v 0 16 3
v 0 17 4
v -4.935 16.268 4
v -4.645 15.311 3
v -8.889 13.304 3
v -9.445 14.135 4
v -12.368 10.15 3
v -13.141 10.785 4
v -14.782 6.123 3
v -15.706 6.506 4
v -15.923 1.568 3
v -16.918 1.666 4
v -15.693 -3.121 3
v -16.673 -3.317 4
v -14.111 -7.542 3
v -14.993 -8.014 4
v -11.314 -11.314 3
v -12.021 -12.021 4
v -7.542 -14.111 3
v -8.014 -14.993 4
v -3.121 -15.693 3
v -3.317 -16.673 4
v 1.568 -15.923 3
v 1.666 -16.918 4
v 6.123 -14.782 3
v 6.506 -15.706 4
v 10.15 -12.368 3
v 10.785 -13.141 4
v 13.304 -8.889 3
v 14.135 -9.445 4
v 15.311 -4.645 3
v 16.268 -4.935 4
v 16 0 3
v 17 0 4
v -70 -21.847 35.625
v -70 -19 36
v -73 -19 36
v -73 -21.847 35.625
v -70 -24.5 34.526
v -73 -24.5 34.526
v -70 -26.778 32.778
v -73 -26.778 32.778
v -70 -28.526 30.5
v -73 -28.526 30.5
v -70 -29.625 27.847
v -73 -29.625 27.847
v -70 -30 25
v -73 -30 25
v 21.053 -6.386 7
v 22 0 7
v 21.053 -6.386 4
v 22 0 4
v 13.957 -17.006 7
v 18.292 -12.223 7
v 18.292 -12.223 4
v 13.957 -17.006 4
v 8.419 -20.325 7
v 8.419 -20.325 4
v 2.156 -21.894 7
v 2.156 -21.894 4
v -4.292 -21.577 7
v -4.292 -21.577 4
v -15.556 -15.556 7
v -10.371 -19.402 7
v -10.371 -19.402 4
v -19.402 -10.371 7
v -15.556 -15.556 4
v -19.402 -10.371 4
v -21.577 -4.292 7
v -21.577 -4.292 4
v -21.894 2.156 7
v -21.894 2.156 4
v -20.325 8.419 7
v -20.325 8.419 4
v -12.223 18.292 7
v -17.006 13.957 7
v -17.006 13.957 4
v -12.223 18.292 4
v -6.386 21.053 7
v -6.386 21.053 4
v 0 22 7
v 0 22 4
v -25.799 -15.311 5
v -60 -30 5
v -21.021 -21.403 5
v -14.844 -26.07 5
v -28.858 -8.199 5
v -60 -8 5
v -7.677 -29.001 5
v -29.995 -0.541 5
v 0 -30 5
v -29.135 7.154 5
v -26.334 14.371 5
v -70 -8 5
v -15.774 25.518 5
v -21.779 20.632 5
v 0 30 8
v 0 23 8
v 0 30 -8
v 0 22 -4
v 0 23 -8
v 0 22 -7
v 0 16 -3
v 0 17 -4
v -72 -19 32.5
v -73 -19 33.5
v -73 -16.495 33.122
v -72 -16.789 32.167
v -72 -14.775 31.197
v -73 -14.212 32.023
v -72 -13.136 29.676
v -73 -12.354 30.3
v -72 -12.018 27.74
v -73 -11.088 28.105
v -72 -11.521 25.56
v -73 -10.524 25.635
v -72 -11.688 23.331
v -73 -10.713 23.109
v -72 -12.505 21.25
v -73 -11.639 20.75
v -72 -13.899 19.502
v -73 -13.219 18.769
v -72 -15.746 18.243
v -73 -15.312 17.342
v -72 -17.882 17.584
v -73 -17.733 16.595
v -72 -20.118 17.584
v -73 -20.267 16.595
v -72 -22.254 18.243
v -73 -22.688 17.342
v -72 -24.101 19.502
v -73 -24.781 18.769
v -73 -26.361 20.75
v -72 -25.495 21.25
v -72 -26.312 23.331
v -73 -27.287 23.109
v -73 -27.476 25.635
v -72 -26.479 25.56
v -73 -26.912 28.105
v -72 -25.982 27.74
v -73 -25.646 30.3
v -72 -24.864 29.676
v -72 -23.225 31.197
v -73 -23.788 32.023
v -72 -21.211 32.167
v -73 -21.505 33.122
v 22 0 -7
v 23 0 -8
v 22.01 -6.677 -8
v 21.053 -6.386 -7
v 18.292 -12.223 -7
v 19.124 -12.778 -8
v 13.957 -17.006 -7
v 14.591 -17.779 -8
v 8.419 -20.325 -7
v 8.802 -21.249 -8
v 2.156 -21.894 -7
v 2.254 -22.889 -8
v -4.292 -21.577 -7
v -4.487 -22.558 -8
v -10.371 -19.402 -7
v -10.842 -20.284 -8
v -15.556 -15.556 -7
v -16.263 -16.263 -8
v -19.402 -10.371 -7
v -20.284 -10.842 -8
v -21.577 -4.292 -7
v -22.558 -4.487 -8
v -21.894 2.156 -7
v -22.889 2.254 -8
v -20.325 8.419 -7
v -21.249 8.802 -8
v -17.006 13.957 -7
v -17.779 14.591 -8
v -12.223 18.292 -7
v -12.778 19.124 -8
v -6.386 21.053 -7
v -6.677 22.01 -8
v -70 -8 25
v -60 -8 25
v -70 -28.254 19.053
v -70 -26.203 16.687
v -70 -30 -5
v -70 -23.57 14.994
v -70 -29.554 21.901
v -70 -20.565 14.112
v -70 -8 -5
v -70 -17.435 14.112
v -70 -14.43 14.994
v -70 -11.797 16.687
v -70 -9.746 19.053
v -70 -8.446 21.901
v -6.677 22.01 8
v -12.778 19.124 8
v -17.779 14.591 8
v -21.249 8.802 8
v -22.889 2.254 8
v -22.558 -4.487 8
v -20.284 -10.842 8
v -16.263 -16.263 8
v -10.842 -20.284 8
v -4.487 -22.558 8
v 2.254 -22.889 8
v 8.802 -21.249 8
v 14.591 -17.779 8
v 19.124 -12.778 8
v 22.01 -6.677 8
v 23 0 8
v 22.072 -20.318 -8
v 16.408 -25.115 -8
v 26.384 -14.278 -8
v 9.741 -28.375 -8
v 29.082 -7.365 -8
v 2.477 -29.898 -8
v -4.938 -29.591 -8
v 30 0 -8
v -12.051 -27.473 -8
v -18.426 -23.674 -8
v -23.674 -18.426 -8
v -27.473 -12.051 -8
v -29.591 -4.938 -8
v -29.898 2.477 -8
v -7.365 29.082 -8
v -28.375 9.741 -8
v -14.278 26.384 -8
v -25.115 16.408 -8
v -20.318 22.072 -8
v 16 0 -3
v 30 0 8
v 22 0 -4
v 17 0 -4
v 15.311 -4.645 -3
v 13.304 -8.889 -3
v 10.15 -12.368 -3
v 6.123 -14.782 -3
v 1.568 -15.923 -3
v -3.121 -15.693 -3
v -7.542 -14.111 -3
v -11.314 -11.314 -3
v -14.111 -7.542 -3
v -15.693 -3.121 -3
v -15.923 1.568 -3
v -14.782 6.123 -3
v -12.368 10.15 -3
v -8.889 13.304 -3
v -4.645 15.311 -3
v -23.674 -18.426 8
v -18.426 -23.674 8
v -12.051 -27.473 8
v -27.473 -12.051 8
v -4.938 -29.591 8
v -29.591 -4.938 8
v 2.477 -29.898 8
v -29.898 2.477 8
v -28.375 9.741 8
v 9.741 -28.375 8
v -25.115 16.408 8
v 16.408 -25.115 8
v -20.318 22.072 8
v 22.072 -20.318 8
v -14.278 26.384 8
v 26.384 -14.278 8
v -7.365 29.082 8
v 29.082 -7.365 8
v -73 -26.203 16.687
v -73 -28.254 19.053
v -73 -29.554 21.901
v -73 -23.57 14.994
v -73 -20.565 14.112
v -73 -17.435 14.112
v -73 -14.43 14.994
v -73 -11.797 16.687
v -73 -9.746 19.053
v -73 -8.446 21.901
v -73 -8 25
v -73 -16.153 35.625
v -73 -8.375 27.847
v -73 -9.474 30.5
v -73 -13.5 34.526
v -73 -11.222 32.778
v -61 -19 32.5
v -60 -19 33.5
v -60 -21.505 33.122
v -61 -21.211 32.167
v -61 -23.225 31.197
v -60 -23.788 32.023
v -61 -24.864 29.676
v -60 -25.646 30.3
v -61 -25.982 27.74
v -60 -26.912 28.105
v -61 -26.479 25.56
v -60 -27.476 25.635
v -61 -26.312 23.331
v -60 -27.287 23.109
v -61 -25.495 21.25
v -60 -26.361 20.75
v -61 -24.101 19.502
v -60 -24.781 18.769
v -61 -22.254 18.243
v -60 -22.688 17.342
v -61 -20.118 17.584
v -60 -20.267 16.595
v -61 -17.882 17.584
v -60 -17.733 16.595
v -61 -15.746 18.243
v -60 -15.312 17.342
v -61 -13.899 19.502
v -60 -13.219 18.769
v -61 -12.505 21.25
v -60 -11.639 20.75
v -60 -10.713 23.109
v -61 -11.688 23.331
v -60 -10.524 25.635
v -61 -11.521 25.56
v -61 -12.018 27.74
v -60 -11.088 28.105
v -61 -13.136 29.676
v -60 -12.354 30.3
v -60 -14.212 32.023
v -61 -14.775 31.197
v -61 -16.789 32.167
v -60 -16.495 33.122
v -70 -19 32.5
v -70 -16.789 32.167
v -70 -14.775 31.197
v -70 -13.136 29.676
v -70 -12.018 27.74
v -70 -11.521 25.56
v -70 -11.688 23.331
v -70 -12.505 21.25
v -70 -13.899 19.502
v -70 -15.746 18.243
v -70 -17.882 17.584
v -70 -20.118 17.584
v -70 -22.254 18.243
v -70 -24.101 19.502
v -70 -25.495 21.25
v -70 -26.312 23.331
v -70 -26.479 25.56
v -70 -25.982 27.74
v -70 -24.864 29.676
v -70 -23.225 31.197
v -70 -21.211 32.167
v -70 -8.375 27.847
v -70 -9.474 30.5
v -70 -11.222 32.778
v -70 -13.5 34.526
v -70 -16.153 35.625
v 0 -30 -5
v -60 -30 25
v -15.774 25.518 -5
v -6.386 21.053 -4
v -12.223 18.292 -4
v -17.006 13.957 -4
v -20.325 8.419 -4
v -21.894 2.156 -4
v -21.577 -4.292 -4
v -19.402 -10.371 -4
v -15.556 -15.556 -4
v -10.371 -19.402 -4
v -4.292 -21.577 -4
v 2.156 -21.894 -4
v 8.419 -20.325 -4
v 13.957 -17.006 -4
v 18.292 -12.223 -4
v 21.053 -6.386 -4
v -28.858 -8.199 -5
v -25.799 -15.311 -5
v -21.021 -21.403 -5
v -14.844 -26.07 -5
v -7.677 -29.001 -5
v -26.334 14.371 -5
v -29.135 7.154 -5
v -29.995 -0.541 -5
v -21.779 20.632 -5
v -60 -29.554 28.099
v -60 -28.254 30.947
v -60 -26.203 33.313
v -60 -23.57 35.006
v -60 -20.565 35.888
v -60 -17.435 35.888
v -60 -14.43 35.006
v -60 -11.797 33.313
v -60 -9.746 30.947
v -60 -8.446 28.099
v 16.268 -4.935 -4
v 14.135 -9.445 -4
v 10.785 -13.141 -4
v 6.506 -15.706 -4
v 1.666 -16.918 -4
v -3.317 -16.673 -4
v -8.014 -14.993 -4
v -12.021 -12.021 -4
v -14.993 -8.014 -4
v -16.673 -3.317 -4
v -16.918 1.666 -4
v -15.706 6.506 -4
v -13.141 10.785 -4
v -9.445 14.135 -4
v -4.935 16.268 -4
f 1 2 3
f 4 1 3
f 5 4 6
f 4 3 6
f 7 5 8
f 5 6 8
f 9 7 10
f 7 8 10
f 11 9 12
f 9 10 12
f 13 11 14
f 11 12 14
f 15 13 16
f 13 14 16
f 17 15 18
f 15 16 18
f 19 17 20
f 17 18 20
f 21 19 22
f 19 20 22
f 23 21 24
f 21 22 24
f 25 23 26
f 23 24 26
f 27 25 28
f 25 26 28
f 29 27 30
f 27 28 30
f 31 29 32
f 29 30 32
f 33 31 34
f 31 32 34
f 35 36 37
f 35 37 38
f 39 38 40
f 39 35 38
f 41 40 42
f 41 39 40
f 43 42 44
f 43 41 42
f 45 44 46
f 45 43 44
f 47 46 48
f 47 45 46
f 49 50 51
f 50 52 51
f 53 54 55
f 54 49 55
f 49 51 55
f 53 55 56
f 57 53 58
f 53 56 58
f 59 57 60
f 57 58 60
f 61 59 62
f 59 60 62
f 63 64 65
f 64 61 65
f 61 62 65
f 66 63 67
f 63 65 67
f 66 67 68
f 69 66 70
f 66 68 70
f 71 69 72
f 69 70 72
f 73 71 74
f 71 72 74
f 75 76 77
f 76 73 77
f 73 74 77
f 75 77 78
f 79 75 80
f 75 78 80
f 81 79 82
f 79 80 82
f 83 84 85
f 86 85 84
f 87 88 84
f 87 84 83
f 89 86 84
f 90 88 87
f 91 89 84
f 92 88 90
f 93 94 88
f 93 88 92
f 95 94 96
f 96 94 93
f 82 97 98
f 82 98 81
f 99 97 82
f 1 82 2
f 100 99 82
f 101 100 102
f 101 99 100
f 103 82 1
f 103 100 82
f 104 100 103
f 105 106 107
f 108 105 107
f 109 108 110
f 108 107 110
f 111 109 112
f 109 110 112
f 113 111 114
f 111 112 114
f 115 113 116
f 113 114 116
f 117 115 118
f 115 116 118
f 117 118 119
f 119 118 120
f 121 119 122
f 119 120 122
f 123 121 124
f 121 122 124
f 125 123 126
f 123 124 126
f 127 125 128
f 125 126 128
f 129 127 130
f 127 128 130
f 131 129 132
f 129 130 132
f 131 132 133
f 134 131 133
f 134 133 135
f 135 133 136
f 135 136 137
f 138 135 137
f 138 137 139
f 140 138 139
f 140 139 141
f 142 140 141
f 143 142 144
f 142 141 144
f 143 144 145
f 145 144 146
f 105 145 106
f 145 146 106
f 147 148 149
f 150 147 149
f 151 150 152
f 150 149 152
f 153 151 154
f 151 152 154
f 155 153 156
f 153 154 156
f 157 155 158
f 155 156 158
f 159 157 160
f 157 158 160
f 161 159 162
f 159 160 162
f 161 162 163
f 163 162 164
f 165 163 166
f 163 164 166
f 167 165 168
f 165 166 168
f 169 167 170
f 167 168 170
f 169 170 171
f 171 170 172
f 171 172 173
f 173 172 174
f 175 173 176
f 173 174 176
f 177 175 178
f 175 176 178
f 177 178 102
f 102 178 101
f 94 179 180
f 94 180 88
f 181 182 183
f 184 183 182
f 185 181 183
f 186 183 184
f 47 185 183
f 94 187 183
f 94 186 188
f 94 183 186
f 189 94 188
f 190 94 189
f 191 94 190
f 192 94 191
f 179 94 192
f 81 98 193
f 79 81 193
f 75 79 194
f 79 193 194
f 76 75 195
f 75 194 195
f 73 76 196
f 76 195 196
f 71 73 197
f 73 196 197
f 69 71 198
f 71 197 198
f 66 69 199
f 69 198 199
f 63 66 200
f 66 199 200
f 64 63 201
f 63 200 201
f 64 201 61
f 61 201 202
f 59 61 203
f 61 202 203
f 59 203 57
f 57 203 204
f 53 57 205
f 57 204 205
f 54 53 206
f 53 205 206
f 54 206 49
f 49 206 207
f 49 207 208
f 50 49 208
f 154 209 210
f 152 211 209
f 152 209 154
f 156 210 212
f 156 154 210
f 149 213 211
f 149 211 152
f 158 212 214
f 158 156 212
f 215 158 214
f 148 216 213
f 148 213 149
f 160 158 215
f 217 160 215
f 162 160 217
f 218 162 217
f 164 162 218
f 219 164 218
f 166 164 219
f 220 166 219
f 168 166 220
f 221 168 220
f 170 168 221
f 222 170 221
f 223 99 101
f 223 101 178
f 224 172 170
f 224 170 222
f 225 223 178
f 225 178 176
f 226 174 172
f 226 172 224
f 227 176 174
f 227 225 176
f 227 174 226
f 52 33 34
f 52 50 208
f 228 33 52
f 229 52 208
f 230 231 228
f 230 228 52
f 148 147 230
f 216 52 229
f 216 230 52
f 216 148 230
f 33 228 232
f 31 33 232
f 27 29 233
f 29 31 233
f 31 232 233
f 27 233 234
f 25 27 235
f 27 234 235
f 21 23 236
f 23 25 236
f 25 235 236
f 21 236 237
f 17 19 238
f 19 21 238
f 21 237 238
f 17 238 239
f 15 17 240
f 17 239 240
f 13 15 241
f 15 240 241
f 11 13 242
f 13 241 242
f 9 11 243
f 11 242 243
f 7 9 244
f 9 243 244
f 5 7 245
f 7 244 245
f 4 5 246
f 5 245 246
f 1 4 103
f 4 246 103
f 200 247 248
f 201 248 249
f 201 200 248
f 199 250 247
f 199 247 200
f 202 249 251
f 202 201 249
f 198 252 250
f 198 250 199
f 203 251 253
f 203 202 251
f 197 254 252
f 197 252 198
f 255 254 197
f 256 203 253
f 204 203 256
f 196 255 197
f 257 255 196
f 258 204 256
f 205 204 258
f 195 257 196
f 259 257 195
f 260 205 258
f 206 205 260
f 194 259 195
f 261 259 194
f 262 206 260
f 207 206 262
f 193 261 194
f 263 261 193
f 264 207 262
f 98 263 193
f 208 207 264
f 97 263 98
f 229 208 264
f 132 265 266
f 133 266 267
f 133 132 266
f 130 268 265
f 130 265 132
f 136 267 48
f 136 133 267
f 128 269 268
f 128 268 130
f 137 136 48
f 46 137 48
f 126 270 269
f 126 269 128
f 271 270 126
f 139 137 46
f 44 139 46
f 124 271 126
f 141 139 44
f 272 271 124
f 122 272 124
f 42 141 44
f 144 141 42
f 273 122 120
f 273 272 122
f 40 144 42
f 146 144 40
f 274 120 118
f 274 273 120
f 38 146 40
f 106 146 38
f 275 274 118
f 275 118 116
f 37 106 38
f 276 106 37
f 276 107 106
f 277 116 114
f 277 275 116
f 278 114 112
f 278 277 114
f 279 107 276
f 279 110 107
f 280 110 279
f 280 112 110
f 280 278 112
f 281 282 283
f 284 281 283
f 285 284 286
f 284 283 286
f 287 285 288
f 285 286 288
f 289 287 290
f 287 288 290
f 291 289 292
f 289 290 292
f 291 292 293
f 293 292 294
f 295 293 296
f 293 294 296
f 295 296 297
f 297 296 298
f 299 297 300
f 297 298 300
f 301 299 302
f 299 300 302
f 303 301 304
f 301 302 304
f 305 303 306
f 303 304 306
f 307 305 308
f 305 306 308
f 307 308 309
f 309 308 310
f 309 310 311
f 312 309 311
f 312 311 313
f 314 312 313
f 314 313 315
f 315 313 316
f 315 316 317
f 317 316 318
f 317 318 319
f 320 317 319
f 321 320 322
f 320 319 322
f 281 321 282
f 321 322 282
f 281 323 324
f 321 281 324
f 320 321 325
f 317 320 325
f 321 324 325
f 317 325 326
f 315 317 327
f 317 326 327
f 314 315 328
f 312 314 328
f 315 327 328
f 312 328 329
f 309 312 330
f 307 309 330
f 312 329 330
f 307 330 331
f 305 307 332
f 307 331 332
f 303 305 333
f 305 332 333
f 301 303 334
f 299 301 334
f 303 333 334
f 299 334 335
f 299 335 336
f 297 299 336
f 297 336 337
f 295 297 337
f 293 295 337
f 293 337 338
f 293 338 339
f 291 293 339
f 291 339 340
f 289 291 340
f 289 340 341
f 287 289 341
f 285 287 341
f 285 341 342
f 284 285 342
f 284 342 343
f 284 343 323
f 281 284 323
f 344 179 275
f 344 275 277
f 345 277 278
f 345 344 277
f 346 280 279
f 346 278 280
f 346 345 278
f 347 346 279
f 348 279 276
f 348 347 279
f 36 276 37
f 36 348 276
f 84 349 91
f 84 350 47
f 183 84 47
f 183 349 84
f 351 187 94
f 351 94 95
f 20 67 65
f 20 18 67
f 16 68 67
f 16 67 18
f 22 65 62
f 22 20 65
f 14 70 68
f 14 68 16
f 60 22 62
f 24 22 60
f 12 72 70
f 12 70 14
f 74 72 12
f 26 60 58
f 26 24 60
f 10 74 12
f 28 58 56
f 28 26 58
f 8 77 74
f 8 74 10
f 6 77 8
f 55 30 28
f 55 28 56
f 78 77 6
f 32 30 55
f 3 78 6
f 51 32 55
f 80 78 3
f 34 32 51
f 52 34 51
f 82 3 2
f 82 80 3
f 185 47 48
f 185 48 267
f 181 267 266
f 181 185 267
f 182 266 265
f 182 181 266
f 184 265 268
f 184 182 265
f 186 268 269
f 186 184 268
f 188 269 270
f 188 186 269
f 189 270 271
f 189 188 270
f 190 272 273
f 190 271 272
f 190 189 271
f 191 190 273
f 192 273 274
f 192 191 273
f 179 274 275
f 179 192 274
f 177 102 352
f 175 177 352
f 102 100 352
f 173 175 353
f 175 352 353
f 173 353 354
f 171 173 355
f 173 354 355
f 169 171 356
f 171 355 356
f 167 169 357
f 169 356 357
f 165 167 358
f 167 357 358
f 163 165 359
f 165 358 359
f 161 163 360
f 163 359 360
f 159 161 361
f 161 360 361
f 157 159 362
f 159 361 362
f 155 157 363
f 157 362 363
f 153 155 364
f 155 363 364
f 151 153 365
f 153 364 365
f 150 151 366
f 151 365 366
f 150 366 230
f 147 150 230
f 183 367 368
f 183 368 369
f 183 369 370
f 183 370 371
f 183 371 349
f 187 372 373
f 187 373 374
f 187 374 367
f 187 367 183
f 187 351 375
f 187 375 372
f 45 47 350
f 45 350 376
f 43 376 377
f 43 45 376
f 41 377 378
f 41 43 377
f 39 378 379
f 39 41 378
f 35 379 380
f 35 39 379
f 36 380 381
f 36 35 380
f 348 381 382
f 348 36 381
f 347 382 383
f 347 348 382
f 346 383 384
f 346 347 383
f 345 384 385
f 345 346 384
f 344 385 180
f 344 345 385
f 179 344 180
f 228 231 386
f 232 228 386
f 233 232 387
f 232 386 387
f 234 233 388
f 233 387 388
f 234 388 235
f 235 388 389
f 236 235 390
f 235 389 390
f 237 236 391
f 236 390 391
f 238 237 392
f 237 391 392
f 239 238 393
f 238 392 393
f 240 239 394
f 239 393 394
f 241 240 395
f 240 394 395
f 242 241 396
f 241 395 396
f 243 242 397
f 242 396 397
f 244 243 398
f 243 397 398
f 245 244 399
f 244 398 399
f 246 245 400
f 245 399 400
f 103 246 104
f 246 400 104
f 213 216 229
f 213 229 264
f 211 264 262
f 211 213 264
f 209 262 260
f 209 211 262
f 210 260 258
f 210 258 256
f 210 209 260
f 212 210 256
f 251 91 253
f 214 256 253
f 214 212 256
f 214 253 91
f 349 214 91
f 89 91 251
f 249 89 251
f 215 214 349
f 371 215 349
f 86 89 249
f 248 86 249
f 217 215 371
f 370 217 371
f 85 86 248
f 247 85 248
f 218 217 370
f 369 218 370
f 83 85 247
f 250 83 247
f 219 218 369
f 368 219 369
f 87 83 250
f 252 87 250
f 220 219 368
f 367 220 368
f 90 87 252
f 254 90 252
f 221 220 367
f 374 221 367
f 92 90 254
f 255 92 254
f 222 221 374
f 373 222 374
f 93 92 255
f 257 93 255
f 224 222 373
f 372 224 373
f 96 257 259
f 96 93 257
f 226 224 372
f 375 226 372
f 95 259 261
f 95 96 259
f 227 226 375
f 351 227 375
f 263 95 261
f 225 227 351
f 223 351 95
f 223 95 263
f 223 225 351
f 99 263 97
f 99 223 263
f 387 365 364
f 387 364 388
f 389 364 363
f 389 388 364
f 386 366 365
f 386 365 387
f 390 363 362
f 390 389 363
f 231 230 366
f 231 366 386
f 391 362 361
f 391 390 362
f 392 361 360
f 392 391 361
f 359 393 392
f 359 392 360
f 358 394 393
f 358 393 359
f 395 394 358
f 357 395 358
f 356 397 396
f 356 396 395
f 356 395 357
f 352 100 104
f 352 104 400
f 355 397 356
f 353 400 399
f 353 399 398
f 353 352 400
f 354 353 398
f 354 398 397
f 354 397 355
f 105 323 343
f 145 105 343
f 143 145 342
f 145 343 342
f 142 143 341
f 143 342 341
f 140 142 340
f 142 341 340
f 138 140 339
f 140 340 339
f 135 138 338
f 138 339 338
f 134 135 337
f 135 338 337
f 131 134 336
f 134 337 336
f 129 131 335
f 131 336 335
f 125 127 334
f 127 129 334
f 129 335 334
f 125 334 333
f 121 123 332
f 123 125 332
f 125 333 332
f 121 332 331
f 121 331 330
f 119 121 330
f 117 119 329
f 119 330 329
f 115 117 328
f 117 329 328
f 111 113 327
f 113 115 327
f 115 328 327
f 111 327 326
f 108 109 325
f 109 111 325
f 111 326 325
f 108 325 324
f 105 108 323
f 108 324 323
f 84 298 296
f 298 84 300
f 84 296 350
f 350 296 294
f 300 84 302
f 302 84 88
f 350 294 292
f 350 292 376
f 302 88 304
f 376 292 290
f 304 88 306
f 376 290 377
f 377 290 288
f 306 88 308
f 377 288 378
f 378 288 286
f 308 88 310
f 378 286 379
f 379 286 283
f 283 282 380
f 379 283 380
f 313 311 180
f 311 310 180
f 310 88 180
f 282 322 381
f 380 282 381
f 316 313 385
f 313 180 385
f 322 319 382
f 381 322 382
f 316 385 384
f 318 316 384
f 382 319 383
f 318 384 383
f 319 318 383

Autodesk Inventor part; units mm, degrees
ref_plane "YZ Plane" through (0, 0, 0) normal (1, 0, 0) x (0, 1, 0)
ref_plane "XZ Plane" through (0, 0, 0) normal (0, 1, 0) x (-1, 0, 0)
ref_plane "XY Plane" through (0, 0, 0) normal (0, 0, 1) x (1, 0, 0)
sketch "스케치1" plane through (0, 0, 0) normal (0, 0, 1) x (1, 0, 0)
  arc A0 (0, 16) -> (16, 0) centre (0, 0) ccw
  arc A1 (0, 22) -> (22, 0) centre (0, 0) ccw
  arc A2 (0, 30) -> (30, 0) centre (0, 0) ccw
  line L0 (0, -30) -> (-70, -30)
  line L1 (-70, -30) -> (-70, -8)
  line L2 (-70, -8) -> (-15.7735, 25.5185)
  line L3 (0, -30) -> (0, 30) construction
  line L4 (-30, 0) -> (30, 0) construction
  line L5 (0, 30) -> (0, 16)
  line L6 (16, 0) -> (30, 0)
  point P0 (0, 22)
  point P1 (22, 0)
  dimension "d0" = 32
  dimension "d1" = 44
  dimension "d2" = 60
  dimension "d3" = 70
  dimension "d4" = 22
extrude "돌출1" add sketch "스케치1" along normal blind 4 contours A0 L6 A1 L5
extrude "돌출2" add sketch "스케치1" along normal blind 8 contours A1 L6 A2 L5
extrude "돌출3" add sketch "스케치1" along normal blind 5 contours A2 L0 L1 L2
chamfer "모따기1" distance 1 angle 45 1 edges at (-15.5563, -15.5563, 8)
chamfer "모따기2" distance 1 angle 45 1 edges at (-11.3137, -11.3137, 4)
mirror "미러1" about plane through (0, 0, 0) normal (0, 0, -1)
ref_plane "작업 평면1" through (-70, -30, 0) normal (-1, 0, 0) x (0, 0, 1)
sketch "스케치2" plane through (-70, -30, 0) normal (-1, 0, 0) x (0, 0, 1)
  line L0 (-5, 0) -> (-5, 55.5185) projected
  line L1 (-5, 0) -> (25, 0)
  circle A0 centre (25, 11) radius 7.5
  circle A1 centre (25, 11) radius 11
  line L2 (25, 22) -> (-5, 22)
  line L3 (-5, 22) -> (-5, 0) projected
  line L4 (25, 0) -> (25, 22) construction
  point P0 (0, 30)
  dimension "d17" = 30
  dimension "d21" = 11
  dimension "d22" = 15
  dimension "d23" = 22
extrude "돌출4" add sketch "스케치2" against normal blind 10 contours L0 L2 A1 L1
extrude "돌출5" add sketch "스케치2" against normal blind 10 contours A1
extrude "돌출6" add sketch "스케치2" along normal blind 3 contours A1
chamfer "모따기3" distance 1 angle 45 1 edges at (-73, -19, 17.5)
chamfer "모따기4" distance 1 angle 45 1 edges at (-60, -19, 17.5)
properties part number "Day02_Task02"
